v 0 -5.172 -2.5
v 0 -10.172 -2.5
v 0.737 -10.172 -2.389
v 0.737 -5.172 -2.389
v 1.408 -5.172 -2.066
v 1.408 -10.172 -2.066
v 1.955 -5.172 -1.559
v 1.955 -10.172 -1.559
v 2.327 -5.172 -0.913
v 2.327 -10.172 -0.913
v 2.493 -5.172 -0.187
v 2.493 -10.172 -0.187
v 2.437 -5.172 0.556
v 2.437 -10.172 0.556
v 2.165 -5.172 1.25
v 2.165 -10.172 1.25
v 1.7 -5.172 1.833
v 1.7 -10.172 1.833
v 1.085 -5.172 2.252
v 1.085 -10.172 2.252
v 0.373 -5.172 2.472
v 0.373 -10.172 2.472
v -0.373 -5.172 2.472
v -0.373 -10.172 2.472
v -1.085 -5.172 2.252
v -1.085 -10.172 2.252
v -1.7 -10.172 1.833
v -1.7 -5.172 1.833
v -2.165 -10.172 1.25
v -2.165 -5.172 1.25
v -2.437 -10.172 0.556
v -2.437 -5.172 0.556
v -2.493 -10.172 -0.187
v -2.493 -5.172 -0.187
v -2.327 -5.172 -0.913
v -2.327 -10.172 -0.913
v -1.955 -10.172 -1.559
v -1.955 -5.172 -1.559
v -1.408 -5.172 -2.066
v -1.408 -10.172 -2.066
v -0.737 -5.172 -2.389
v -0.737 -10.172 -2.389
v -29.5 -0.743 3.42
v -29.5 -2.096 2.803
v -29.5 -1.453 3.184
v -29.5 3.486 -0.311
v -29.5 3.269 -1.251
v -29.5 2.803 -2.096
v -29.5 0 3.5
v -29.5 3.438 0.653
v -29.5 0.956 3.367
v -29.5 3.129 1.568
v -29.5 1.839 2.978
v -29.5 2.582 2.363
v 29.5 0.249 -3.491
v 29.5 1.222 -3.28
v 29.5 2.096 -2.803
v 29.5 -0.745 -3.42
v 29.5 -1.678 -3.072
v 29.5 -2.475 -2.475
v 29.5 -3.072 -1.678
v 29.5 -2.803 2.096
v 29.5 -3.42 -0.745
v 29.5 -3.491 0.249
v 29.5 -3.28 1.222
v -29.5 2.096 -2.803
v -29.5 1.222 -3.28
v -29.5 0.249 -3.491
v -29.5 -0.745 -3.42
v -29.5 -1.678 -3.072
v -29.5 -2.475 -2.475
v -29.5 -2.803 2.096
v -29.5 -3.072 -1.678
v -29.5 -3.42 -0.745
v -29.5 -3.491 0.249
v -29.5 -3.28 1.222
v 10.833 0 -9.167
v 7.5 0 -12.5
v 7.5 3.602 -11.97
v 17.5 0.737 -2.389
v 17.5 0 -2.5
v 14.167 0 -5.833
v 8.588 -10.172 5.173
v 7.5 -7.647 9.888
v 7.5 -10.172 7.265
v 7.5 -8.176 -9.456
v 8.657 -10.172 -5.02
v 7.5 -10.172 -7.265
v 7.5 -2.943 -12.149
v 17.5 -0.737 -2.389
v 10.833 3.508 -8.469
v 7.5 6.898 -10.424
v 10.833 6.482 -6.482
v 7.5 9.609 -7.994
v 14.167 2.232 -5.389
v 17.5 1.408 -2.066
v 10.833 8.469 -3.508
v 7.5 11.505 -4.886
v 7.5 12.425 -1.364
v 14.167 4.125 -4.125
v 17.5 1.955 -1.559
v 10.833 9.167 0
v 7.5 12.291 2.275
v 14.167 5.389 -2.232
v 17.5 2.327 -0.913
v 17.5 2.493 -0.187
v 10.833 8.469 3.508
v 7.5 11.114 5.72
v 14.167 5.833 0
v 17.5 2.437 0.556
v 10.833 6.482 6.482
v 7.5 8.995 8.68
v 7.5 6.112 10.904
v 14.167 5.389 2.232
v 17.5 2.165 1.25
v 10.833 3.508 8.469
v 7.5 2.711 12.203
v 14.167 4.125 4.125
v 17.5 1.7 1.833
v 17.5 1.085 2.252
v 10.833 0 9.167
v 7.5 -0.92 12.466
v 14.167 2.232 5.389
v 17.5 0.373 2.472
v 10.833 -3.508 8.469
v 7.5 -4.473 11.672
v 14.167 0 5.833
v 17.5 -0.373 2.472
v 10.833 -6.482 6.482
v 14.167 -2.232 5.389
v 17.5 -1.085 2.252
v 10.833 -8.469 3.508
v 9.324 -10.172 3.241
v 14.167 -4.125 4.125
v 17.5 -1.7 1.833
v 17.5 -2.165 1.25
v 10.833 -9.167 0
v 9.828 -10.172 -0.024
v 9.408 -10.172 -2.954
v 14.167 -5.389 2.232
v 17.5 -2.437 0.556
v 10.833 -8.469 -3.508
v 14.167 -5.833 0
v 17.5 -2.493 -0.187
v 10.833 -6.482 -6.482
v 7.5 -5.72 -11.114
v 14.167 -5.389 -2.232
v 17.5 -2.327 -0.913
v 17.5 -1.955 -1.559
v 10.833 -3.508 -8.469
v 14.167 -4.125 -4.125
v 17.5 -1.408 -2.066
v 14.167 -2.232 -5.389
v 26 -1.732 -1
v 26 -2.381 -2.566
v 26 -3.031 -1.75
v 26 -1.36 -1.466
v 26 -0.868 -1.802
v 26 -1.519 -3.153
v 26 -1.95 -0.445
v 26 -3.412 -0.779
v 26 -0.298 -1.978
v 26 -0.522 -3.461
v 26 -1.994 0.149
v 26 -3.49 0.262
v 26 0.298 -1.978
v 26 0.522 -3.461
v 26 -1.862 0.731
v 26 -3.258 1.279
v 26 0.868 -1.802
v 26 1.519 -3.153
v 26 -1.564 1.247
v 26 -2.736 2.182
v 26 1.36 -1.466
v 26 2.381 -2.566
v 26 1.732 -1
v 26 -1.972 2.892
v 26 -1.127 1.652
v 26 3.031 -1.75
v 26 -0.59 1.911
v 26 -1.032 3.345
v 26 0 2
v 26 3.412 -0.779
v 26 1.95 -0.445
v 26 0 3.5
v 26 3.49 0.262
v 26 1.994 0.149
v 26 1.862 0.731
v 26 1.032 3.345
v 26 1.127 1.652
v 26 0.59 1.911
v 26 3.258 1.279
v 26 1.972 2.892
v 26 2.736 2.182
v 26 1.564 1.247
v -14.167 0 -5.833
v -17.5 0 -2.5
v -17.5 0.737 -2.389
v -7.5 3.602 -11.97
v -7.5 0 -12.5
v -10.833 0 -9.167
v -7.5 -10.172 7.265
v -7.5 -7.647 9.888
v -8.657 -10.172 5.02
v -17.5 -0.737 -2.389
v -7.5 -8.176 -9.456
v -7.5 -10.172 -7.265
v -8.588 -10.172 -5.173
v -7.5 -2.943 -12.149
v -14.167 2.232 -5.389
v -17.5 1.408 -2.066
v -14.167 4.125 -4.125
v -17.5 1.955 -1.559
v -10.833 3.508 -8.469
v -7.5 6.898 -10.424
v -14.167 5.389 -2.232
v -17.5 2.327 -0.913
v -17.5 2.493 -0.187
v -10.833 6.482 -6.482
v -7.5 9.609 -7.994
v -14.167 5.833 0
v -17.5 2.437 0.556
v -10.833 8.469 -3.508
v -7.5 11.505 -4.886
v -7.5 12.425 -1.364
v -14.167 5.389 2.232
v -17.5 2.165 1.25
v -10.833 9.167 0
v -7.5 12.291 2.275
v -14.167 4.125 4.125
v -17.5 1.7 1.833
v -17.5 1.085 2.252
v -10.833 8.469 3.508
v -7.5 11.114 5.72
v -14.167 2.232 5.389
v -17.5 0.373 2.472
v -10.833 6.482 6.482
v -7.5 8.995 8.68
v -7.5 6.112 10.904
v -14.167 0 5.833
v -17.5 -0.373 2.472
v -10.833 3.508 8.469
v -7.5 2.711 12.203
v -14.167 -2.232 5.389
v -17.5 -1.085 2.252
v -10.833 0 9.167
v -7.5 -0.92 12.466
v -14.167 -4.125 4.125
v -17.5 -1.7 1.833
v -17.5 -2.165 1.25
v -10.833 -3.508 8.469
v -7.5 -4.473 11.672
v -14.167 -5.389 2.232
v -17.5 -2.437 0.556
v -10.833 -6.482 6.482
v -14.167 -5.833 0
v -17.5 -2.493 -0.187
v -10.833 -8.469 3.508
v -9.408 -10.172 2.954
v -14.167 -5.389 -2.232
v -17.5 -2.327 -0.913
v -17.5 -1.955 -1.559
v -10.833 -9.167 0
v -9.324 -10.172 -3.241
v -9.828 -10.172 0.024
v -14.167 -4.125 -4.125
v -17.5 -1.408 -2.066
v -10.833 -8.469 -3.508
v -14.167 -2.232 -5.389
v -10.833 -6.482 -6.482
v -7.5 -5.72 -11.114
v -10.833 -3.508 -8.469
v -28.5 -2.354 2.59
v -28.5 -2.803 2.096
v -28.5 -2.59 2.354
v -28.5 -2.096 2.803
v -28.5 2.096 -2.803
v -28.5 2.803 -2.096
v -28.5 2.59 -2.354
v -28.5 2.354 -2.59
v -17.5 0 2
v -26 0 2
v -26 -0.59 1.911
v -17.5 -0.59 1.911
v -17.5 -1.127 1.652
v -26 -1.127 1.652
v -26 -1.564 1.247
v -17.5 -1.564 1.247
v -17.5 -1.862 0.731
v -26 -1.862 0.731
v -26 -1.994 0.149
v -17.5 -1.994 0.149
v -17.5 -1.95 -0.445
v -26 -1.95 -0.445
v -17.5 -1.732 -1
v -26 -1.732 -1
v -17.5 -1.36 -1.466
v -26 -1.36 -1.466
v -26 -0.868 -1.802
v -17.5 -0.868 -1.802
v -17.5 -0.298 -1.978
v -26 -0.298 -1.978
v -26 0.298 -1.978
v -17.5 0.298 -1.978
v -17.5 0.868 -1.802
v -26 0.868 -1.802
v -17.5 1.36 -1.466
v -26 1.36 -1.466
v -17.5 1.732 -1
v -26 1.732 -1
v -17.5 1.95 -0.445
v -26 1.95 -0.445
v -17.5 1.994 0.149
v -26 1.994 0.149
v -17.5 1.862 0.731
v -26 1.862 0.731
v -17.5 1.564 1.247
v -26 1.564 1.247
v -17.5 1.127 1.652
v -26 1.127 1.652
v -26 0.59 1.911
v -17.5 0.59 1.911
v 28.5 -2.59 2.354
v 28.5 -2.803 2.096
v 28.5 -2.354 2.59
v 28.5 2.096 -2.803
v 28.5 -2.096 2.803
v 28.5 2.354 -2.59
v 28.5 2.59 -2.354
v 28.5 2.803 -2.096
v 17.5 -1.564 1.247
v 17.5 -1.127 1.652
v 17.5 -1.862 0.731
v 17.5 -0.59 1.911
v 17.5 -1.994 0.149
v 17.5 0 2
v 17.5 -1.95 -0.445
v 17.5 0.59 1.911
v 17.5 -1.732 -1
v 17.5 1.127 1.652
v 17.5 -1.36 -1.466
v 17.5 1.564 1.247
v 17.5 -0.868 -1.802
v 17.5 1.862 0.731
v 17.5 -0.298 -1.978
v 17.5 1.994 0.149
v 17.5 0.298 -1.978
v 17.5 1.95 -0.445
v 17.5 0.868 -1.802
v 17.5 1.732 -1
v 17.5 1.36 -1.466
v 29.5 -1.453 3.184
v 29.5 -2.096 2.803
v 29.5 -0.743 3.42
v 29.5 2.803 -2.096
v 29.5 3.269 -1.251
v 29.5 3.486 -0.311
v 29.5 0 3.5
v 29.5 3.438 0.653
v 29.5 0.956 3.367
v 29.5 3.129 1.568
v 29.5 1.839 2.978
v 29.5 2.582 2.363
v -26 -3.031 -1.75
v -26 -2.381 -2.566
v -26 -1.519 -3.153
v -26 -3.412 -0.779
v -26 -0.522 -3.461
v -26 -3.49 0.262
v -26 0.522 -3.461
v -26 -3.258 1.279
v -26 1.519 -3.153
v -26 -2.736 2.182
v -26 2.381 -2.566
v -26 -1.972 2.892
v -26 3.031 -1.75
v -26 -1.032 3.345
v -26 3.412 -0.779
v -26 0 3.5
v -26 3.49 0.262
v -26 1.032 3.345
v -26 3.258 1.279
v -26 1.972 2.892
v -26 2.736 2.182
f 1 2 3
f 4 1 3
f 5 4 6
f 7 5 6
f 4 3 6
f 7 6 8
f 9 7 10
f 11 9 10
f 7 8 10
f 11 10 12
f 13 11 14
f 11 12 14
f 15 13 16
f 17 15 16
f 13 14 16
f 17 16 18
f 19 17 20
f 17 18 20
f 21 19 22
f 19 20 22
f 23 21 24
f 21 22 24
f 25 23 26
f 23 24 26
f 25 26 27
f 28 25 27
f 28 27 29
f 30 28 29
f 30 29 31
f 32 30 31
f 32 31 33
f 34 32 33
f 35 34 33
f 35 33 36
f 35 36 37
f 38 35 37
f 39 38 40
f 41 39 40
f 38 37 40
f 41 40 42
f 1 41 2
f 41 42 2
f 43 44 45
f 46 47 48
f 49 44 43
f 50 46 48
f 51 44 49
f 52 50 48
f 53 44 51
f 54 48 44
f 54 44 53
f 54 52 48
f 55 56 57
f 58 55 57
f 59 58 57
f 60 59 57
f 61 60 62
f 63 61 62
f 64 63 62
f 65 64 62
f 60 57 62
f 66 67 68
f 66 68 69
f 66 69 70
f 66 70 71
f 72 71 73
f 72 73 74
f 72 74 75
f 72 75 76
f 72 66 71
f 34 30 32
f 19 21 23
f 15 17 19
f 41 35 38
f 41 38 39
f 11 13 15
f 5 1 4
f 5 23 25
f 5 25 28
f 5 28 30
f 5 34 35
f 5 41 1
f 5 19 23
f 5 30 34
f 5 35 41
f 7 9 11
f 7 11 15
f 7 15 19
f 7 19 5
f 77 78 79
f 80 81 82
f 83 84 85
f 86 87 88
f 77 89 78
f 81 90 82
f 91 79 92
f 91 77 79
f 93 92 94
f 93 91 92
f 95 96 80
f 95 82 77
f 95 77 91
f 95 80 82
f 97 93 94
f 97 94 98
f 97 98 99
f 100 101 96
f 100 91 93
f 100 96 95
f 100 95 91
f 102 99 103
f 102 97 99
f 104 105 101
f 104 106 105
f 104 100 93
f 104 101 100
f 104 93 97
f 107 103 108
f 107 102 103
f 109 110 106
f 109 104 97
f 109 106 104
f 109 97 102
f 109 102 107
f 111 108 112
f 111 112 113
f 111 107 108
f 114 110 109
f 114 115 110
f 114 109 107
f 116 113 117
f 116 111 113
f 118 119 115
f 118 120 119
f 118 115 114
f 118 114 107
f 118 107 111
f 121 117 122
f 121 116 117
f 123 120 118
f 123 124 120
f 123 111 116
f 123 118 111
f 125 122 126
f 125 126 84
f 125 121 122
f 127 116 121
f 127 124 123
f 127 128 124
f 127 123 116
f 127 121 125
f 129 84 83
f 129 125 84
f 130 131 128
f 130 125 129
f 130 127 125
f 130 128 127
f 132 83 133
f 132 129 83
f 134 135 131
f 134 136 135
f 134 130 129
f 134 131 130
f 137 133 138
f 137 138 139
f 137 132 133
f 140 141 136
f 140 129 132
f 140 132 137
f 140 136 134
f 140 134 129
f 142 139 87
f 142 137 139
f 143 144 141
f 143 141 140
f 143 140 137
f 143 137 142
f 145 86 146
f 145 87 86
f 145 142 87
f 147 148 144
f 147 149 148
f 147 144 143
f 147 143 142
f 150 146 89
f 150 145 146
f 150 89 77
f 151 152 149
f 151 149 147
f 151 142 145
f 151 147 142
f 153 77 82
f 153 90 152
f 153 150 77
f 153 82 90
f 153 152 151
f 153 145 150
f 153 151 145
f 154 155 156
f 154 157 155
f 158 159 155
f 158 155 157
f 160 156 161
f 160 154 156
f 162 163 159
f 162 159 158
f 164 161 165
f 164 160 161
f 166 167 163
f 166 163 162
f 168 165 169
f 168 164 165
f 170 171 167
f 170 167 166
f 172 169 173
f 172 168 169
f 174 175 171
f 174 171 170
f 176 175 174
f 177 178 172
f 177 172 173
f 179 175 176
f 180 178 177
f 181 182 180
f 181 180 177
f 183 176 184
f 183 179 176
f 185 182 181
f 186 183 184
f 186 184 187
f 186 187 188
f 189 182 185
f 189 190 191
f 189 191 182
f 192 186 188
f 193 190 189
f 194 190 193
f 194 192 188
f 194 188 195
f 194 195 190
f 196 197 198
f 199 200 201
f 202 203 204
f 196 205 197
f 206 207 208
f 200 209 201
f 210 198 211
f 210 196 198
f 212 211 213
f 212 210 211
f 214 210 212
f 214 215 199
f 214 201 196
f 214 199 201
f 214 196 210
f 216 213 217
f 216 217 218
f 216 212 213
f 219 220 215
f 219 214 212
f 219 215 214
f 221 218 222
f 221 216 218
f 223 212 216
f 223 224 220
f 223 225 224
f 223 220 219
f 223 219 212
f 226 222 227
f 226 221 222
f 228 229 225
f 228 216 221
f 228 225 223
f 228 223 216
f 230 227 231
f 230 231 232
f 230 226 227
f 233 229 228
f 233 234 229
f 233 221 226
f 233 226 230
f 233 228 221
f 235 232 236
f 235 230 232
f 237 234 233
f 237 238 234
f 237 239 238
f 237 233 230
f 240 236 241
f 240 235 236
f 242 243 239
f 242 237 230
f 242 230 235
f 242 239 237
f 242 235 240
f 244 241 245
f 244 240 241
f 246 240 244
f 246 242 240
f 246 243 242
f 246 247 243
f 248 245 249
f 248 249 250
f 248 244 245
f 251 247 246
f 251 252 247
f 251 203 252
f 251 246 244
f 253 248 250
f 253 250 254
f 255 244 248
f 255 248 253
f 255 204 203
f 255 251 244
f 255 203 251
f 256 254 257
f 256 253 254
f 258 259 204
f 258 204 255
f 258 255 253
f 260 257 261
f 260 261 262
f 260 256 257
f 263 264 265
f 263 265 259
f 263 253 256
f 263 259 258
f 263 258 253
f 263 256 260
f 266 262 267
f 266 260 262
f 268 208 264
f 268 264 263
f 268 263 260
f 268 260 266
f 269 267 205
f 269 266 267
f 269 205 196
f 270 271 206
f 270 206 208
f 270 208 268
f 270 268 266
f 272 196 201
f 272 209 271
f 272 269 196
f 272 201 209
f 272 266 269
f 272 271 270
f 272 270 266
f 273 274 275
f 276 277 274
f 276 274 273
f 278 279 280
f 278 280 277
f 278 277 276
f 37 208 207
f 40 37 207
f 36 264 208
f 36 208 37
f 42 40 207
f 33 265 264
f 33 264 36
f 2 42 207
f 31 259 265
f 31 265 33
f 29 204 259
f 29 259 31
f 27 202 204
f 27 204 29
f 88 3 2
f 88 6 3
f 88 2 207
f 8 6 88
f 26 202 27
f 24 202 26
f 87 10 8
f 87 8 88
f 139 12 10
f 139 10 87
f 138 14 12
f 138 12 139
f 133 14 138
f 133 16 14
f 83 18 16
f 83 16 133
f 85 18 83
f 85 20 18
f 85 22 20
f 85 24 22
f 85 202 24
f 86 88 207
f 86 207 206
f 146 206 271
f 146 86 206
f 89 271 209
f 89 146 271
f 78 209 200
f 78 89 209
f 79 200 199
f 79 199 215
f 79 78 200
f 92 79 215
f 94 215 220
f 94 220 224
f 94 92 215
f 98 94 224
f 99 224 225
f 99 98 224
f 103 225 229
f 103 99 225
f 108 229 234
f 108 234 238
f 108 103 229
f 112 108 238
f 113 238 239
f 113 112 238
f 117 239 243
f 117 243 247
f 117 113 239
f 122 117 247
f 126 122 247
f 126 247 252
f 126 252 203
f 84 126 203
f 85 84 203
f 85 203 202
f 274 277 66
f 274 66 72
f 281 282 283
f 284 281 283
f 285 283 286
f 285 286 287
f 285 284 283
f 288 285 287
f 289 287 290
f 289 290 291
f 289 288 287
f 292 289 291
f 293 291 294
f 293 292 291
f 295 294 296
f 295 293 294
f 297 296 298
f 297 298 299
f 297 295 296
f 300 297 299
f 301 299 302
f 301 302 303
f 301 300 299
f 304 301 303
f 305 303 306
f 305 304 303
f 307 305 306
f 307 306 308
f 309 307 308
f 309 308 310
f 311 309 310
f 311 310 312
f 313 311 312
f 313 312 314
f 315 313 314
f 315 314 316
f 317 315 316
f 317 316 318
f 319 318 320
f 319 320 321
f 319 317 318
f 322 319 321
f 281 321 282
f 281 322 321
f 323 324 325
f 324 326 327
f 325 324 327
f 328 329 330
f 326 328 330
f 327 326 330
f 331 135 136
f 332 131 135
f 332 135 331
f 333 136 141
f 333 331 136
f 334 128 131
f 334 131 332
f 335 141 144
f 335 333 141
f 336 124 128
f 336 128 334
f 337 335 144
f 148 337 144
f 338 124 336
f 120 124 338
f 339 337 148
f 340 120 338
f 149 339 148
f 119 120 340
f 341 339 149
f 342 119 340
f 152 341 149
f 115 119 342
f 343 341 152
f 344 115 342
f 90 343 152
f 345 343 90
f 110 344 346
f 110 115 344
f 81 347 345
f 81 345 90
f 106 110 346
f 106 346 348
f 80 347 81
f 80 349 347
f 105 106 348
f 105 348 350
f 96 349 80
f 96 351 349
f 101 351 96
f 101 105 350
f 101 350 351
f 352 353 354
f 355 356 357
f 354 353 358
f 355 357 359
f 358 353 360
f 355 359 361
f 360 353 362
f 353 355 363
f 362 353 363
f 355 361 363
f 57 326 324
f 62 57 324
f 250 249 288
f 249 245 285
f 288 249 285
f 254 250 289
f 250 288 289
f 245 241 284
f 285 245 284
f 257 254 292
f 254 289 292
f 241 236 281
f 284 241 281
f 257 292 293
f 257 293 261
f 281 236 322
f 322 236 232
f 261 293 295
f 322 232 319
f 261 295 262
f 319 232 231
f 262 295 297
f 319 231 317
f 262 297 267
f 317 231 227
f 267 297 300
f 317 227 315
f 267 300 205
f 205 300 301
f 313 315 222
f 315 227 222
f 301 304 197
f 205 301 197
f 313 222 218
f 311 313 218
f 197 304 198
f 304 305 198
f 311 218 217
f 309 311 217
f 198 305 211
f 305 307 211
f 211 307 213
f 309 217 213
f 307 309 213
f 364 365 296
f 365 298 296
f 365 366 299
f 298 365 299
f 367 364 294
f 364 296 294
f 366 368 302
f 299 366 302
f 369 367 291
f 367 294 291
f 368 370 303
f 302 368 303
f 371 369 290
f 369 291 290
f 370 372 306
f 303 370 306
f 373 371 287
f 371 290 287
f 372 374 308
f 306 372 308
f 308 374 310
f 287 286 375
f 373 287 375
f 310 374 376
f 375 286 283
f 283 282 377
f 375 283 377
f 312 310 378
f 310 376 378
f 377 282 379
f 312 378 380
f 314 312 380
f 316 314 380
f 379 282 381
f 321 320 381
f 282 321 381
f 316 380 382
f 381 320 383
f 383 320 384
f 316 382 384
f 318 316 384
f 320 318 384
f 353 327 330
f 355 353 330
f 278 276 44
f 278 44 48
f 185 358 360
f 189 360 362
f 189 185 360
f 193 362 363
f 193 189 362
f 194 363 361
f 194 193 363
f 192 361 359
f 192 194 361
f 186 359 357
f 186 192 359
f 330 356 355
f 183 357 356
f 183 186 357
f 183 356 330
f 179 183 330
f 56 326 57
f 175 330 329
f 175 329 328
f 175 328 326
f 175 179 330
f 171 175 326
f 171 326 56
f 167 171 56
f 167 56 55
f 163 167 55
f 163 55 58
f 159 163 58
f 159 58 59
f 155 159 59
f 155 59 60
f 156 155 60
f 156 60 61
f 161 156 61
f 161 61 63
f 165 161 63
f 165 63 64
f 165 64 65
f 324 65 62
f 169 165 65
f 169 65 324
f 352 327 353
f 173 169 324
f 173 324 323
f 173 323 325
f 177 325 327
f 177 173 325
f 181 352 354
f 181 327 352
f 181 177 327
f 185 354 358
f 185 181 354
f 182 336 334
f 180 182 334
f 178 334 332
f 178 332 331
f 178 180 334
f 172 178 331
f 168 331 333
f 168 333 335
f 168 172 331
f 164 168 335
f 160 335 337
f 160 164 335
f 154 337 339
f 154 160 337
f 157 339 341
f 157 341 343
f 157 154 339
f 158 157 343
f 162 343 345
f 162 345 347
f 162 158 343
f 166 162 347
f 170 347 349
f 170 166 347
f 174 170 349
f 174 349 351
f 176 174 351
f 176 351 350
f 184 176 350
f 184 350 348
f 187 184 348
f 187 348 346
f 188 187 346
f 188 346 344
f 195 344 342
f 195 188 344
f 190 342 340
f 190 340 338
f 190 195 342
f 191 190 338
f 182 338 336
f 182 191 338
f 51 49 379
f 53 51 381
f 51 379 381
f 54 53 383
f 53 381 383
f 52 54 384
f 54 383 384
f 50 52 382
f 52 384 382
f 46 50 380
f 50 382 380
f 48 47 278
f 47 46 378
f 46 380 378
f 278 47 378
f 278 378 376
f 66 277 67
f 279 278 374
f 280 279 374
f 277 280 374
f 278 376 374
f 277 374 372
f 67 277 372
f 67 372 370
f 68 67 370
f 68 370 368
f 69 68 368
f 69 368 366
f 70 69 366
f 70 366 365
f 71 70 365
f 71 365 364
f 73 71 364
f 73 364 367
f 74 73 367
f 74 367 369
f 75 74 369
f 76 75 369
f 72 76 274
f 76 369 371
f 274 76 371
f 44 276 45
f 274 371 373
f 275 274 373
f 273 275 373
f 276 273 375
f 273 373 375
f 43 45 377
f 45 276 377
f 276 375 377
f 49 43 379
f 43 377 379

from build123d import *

# Parameters (mm, degrees)
SKETCH1_R           = 12.5
BOSS_EXTRUDE1_DEPTH = 17.5
SKETCH2_R           = 2
BOSS_EXTRUDE2_DEPTH = 26
CHAMFER1_SIZE       = 10
SKETCH3_W           = 28.997372317
SKETCH3_H           = 7.197339184
CUT_EXTRUDE1_DEPTH  = 20
SKETCH4_R           = 5
CUT_EXTRUDE2_DEPTH  = 5
SKETCH5_R           = 3.5
BOSS_EXTRUDE3_DEPTH = 3.5
CUT_EXTRUDE6_START  = -1
CUT_EXTRUDE6_DEPTH  = 1
SKETCH11_R          = 5
SKETCH11_R_2        = 1.25
BOSS_EXTRUDE4_DEPTH = 5
SKETCH12_R          = 2.5
CUT_EXTRUDE7_DEPTH  = 5


with BuildPart() as part:
    # Sketch1 → Boss-Extrude1 (new, symmetric)
    with BuildSketch(Plane(origin=(0, 0, 0), x_dir=(0, 0, -1), z_dir=(1, 0, 0))):
        Circle(SKETCH1_R)
    extrude(amount=BOSS_EXTRUDE1_DEPTH, both=True)

    # Sketch2 → Boss-Extrude2 (add, symmetric)
    with BuildSketch(Plane(origin=(0, 0, 0), x_dir=(0, 0, -1), z_dir=(1, 0, 0))):
        with Locations(Location((0, 0, 0), (0, 0, 180))):
            Circle(SKETCH2_R)
    extrude(amount=BOSS_EXTRUDE2_DEPTH, both=True)

    # Chamfer1
    chamfer1_edges = [part.edges().sort_by_distance(p)[0] for p in [
        (-17.5, 0, 12.5),
        (17.5, 0, 12.5),
    ]]
    chamfer(chamfer1_edges, length=CHAMFER1_SIZE)

    # Sketch3 → Cut-Extrude1 (cut, symmetric)
    with BuildSketch(Plane(origin=(0, 0, 0), x_dir=(0, 0, -1), z_dir=(1, 0, 0))):
        with Locations((0.644848308, -13.770631617)):
            Rectangle(SKETCH3_W, SKETCH3_H)
    extrude(amount=CUT_EXTRUDE1_DEPTH, both=True, mode=Mode.SUBTRACT)

    # Sketch4 → Cut-Extrude2 (cut)
    with BuildSketch(Plane.XZ.offset(10.171962025)):
        with Locations(Location((0, 0, 0), (0, 0, 270))):
            Circle(SKETCH4_R)
    extrude(amount=-CUT_EXTRUDE2_DEPTH, mode=Mode.SUBTRACT)

    # Sketch5 → Boss-Extrude3 (add)
    with BuildSketch(Plane.ZY.offset(26)):
        Circle(SKETCH5_R)
    boss_extrude3 = extrude(amount=BOSS_EXTRUDE3_DEPTH)

    # Sketch6 → Cut-Extrude6 (cut)
    with BuildSketch(Plane.ZY.offset(29.5).offset(CUT_EXTRUDE6_START)):
        with BuildLine():
            Line((2.803043133, -2.095936352), (-2.095936352, 2.803043133))
            ThreePointArc((-2.095936352, 2.803043133), (-2.474873734, 2.474873734), (-2.803043133, 2.095936352))
            Line((-2.803043133, 2.095936352), (2.095936352, -2.803043133))
            ThreePointArc((2.095936352, -2.803043133), (2.474873734, -2.474873734), (2.803043133, -2.095936352))
        make_face()
    cut_extrude6 = extrude(amount=CUT_EXTRUDE6_DEPTH, mode=Mode.SUBTRACT)

    # Mirror1: Boss-Extrude3, Cut-Extrude6 across plane
    add(boss_extrude3.mirror(Plane(origin=(0, 0, 0), x_dir=(0, 0, 1), z_dir=(1, 0, 0))))
    add(cut_extrude6.mirror(Plane(origin=(0, 0, 0), x_dir=(0, 0, 1), z_dir=(1, 0, 0))), mode=Mode.SUBTRACT)

    # Sketch11 → Boss-Extrude4 (add)
    with BuildSketch(Plane.XZ.offset(10.171962025)):
        Circle(SKETCH11_R)
        with Locations(Location((0, 0, 0), (0, 0, 270))):
            Circle(SKETCH11_R_2, mode=Mode.SUBTRACT)
    extrude(amount=-BOSS_EXTRUDE4_DEPTH)

    # Sketch12 → Cut-Extrude7 (cut)
    with BuildSketch(Plane.XZ.offset(10.171962025)):
        with Locations(Location((0, 0, 0), (0, 0, 270))):
            Circle(SKETCH12_R)
    extrude(amount=-CUT_EXTRUDE7_DEPTH, mode=Mode.SUBTRACT)


solid = part.part
